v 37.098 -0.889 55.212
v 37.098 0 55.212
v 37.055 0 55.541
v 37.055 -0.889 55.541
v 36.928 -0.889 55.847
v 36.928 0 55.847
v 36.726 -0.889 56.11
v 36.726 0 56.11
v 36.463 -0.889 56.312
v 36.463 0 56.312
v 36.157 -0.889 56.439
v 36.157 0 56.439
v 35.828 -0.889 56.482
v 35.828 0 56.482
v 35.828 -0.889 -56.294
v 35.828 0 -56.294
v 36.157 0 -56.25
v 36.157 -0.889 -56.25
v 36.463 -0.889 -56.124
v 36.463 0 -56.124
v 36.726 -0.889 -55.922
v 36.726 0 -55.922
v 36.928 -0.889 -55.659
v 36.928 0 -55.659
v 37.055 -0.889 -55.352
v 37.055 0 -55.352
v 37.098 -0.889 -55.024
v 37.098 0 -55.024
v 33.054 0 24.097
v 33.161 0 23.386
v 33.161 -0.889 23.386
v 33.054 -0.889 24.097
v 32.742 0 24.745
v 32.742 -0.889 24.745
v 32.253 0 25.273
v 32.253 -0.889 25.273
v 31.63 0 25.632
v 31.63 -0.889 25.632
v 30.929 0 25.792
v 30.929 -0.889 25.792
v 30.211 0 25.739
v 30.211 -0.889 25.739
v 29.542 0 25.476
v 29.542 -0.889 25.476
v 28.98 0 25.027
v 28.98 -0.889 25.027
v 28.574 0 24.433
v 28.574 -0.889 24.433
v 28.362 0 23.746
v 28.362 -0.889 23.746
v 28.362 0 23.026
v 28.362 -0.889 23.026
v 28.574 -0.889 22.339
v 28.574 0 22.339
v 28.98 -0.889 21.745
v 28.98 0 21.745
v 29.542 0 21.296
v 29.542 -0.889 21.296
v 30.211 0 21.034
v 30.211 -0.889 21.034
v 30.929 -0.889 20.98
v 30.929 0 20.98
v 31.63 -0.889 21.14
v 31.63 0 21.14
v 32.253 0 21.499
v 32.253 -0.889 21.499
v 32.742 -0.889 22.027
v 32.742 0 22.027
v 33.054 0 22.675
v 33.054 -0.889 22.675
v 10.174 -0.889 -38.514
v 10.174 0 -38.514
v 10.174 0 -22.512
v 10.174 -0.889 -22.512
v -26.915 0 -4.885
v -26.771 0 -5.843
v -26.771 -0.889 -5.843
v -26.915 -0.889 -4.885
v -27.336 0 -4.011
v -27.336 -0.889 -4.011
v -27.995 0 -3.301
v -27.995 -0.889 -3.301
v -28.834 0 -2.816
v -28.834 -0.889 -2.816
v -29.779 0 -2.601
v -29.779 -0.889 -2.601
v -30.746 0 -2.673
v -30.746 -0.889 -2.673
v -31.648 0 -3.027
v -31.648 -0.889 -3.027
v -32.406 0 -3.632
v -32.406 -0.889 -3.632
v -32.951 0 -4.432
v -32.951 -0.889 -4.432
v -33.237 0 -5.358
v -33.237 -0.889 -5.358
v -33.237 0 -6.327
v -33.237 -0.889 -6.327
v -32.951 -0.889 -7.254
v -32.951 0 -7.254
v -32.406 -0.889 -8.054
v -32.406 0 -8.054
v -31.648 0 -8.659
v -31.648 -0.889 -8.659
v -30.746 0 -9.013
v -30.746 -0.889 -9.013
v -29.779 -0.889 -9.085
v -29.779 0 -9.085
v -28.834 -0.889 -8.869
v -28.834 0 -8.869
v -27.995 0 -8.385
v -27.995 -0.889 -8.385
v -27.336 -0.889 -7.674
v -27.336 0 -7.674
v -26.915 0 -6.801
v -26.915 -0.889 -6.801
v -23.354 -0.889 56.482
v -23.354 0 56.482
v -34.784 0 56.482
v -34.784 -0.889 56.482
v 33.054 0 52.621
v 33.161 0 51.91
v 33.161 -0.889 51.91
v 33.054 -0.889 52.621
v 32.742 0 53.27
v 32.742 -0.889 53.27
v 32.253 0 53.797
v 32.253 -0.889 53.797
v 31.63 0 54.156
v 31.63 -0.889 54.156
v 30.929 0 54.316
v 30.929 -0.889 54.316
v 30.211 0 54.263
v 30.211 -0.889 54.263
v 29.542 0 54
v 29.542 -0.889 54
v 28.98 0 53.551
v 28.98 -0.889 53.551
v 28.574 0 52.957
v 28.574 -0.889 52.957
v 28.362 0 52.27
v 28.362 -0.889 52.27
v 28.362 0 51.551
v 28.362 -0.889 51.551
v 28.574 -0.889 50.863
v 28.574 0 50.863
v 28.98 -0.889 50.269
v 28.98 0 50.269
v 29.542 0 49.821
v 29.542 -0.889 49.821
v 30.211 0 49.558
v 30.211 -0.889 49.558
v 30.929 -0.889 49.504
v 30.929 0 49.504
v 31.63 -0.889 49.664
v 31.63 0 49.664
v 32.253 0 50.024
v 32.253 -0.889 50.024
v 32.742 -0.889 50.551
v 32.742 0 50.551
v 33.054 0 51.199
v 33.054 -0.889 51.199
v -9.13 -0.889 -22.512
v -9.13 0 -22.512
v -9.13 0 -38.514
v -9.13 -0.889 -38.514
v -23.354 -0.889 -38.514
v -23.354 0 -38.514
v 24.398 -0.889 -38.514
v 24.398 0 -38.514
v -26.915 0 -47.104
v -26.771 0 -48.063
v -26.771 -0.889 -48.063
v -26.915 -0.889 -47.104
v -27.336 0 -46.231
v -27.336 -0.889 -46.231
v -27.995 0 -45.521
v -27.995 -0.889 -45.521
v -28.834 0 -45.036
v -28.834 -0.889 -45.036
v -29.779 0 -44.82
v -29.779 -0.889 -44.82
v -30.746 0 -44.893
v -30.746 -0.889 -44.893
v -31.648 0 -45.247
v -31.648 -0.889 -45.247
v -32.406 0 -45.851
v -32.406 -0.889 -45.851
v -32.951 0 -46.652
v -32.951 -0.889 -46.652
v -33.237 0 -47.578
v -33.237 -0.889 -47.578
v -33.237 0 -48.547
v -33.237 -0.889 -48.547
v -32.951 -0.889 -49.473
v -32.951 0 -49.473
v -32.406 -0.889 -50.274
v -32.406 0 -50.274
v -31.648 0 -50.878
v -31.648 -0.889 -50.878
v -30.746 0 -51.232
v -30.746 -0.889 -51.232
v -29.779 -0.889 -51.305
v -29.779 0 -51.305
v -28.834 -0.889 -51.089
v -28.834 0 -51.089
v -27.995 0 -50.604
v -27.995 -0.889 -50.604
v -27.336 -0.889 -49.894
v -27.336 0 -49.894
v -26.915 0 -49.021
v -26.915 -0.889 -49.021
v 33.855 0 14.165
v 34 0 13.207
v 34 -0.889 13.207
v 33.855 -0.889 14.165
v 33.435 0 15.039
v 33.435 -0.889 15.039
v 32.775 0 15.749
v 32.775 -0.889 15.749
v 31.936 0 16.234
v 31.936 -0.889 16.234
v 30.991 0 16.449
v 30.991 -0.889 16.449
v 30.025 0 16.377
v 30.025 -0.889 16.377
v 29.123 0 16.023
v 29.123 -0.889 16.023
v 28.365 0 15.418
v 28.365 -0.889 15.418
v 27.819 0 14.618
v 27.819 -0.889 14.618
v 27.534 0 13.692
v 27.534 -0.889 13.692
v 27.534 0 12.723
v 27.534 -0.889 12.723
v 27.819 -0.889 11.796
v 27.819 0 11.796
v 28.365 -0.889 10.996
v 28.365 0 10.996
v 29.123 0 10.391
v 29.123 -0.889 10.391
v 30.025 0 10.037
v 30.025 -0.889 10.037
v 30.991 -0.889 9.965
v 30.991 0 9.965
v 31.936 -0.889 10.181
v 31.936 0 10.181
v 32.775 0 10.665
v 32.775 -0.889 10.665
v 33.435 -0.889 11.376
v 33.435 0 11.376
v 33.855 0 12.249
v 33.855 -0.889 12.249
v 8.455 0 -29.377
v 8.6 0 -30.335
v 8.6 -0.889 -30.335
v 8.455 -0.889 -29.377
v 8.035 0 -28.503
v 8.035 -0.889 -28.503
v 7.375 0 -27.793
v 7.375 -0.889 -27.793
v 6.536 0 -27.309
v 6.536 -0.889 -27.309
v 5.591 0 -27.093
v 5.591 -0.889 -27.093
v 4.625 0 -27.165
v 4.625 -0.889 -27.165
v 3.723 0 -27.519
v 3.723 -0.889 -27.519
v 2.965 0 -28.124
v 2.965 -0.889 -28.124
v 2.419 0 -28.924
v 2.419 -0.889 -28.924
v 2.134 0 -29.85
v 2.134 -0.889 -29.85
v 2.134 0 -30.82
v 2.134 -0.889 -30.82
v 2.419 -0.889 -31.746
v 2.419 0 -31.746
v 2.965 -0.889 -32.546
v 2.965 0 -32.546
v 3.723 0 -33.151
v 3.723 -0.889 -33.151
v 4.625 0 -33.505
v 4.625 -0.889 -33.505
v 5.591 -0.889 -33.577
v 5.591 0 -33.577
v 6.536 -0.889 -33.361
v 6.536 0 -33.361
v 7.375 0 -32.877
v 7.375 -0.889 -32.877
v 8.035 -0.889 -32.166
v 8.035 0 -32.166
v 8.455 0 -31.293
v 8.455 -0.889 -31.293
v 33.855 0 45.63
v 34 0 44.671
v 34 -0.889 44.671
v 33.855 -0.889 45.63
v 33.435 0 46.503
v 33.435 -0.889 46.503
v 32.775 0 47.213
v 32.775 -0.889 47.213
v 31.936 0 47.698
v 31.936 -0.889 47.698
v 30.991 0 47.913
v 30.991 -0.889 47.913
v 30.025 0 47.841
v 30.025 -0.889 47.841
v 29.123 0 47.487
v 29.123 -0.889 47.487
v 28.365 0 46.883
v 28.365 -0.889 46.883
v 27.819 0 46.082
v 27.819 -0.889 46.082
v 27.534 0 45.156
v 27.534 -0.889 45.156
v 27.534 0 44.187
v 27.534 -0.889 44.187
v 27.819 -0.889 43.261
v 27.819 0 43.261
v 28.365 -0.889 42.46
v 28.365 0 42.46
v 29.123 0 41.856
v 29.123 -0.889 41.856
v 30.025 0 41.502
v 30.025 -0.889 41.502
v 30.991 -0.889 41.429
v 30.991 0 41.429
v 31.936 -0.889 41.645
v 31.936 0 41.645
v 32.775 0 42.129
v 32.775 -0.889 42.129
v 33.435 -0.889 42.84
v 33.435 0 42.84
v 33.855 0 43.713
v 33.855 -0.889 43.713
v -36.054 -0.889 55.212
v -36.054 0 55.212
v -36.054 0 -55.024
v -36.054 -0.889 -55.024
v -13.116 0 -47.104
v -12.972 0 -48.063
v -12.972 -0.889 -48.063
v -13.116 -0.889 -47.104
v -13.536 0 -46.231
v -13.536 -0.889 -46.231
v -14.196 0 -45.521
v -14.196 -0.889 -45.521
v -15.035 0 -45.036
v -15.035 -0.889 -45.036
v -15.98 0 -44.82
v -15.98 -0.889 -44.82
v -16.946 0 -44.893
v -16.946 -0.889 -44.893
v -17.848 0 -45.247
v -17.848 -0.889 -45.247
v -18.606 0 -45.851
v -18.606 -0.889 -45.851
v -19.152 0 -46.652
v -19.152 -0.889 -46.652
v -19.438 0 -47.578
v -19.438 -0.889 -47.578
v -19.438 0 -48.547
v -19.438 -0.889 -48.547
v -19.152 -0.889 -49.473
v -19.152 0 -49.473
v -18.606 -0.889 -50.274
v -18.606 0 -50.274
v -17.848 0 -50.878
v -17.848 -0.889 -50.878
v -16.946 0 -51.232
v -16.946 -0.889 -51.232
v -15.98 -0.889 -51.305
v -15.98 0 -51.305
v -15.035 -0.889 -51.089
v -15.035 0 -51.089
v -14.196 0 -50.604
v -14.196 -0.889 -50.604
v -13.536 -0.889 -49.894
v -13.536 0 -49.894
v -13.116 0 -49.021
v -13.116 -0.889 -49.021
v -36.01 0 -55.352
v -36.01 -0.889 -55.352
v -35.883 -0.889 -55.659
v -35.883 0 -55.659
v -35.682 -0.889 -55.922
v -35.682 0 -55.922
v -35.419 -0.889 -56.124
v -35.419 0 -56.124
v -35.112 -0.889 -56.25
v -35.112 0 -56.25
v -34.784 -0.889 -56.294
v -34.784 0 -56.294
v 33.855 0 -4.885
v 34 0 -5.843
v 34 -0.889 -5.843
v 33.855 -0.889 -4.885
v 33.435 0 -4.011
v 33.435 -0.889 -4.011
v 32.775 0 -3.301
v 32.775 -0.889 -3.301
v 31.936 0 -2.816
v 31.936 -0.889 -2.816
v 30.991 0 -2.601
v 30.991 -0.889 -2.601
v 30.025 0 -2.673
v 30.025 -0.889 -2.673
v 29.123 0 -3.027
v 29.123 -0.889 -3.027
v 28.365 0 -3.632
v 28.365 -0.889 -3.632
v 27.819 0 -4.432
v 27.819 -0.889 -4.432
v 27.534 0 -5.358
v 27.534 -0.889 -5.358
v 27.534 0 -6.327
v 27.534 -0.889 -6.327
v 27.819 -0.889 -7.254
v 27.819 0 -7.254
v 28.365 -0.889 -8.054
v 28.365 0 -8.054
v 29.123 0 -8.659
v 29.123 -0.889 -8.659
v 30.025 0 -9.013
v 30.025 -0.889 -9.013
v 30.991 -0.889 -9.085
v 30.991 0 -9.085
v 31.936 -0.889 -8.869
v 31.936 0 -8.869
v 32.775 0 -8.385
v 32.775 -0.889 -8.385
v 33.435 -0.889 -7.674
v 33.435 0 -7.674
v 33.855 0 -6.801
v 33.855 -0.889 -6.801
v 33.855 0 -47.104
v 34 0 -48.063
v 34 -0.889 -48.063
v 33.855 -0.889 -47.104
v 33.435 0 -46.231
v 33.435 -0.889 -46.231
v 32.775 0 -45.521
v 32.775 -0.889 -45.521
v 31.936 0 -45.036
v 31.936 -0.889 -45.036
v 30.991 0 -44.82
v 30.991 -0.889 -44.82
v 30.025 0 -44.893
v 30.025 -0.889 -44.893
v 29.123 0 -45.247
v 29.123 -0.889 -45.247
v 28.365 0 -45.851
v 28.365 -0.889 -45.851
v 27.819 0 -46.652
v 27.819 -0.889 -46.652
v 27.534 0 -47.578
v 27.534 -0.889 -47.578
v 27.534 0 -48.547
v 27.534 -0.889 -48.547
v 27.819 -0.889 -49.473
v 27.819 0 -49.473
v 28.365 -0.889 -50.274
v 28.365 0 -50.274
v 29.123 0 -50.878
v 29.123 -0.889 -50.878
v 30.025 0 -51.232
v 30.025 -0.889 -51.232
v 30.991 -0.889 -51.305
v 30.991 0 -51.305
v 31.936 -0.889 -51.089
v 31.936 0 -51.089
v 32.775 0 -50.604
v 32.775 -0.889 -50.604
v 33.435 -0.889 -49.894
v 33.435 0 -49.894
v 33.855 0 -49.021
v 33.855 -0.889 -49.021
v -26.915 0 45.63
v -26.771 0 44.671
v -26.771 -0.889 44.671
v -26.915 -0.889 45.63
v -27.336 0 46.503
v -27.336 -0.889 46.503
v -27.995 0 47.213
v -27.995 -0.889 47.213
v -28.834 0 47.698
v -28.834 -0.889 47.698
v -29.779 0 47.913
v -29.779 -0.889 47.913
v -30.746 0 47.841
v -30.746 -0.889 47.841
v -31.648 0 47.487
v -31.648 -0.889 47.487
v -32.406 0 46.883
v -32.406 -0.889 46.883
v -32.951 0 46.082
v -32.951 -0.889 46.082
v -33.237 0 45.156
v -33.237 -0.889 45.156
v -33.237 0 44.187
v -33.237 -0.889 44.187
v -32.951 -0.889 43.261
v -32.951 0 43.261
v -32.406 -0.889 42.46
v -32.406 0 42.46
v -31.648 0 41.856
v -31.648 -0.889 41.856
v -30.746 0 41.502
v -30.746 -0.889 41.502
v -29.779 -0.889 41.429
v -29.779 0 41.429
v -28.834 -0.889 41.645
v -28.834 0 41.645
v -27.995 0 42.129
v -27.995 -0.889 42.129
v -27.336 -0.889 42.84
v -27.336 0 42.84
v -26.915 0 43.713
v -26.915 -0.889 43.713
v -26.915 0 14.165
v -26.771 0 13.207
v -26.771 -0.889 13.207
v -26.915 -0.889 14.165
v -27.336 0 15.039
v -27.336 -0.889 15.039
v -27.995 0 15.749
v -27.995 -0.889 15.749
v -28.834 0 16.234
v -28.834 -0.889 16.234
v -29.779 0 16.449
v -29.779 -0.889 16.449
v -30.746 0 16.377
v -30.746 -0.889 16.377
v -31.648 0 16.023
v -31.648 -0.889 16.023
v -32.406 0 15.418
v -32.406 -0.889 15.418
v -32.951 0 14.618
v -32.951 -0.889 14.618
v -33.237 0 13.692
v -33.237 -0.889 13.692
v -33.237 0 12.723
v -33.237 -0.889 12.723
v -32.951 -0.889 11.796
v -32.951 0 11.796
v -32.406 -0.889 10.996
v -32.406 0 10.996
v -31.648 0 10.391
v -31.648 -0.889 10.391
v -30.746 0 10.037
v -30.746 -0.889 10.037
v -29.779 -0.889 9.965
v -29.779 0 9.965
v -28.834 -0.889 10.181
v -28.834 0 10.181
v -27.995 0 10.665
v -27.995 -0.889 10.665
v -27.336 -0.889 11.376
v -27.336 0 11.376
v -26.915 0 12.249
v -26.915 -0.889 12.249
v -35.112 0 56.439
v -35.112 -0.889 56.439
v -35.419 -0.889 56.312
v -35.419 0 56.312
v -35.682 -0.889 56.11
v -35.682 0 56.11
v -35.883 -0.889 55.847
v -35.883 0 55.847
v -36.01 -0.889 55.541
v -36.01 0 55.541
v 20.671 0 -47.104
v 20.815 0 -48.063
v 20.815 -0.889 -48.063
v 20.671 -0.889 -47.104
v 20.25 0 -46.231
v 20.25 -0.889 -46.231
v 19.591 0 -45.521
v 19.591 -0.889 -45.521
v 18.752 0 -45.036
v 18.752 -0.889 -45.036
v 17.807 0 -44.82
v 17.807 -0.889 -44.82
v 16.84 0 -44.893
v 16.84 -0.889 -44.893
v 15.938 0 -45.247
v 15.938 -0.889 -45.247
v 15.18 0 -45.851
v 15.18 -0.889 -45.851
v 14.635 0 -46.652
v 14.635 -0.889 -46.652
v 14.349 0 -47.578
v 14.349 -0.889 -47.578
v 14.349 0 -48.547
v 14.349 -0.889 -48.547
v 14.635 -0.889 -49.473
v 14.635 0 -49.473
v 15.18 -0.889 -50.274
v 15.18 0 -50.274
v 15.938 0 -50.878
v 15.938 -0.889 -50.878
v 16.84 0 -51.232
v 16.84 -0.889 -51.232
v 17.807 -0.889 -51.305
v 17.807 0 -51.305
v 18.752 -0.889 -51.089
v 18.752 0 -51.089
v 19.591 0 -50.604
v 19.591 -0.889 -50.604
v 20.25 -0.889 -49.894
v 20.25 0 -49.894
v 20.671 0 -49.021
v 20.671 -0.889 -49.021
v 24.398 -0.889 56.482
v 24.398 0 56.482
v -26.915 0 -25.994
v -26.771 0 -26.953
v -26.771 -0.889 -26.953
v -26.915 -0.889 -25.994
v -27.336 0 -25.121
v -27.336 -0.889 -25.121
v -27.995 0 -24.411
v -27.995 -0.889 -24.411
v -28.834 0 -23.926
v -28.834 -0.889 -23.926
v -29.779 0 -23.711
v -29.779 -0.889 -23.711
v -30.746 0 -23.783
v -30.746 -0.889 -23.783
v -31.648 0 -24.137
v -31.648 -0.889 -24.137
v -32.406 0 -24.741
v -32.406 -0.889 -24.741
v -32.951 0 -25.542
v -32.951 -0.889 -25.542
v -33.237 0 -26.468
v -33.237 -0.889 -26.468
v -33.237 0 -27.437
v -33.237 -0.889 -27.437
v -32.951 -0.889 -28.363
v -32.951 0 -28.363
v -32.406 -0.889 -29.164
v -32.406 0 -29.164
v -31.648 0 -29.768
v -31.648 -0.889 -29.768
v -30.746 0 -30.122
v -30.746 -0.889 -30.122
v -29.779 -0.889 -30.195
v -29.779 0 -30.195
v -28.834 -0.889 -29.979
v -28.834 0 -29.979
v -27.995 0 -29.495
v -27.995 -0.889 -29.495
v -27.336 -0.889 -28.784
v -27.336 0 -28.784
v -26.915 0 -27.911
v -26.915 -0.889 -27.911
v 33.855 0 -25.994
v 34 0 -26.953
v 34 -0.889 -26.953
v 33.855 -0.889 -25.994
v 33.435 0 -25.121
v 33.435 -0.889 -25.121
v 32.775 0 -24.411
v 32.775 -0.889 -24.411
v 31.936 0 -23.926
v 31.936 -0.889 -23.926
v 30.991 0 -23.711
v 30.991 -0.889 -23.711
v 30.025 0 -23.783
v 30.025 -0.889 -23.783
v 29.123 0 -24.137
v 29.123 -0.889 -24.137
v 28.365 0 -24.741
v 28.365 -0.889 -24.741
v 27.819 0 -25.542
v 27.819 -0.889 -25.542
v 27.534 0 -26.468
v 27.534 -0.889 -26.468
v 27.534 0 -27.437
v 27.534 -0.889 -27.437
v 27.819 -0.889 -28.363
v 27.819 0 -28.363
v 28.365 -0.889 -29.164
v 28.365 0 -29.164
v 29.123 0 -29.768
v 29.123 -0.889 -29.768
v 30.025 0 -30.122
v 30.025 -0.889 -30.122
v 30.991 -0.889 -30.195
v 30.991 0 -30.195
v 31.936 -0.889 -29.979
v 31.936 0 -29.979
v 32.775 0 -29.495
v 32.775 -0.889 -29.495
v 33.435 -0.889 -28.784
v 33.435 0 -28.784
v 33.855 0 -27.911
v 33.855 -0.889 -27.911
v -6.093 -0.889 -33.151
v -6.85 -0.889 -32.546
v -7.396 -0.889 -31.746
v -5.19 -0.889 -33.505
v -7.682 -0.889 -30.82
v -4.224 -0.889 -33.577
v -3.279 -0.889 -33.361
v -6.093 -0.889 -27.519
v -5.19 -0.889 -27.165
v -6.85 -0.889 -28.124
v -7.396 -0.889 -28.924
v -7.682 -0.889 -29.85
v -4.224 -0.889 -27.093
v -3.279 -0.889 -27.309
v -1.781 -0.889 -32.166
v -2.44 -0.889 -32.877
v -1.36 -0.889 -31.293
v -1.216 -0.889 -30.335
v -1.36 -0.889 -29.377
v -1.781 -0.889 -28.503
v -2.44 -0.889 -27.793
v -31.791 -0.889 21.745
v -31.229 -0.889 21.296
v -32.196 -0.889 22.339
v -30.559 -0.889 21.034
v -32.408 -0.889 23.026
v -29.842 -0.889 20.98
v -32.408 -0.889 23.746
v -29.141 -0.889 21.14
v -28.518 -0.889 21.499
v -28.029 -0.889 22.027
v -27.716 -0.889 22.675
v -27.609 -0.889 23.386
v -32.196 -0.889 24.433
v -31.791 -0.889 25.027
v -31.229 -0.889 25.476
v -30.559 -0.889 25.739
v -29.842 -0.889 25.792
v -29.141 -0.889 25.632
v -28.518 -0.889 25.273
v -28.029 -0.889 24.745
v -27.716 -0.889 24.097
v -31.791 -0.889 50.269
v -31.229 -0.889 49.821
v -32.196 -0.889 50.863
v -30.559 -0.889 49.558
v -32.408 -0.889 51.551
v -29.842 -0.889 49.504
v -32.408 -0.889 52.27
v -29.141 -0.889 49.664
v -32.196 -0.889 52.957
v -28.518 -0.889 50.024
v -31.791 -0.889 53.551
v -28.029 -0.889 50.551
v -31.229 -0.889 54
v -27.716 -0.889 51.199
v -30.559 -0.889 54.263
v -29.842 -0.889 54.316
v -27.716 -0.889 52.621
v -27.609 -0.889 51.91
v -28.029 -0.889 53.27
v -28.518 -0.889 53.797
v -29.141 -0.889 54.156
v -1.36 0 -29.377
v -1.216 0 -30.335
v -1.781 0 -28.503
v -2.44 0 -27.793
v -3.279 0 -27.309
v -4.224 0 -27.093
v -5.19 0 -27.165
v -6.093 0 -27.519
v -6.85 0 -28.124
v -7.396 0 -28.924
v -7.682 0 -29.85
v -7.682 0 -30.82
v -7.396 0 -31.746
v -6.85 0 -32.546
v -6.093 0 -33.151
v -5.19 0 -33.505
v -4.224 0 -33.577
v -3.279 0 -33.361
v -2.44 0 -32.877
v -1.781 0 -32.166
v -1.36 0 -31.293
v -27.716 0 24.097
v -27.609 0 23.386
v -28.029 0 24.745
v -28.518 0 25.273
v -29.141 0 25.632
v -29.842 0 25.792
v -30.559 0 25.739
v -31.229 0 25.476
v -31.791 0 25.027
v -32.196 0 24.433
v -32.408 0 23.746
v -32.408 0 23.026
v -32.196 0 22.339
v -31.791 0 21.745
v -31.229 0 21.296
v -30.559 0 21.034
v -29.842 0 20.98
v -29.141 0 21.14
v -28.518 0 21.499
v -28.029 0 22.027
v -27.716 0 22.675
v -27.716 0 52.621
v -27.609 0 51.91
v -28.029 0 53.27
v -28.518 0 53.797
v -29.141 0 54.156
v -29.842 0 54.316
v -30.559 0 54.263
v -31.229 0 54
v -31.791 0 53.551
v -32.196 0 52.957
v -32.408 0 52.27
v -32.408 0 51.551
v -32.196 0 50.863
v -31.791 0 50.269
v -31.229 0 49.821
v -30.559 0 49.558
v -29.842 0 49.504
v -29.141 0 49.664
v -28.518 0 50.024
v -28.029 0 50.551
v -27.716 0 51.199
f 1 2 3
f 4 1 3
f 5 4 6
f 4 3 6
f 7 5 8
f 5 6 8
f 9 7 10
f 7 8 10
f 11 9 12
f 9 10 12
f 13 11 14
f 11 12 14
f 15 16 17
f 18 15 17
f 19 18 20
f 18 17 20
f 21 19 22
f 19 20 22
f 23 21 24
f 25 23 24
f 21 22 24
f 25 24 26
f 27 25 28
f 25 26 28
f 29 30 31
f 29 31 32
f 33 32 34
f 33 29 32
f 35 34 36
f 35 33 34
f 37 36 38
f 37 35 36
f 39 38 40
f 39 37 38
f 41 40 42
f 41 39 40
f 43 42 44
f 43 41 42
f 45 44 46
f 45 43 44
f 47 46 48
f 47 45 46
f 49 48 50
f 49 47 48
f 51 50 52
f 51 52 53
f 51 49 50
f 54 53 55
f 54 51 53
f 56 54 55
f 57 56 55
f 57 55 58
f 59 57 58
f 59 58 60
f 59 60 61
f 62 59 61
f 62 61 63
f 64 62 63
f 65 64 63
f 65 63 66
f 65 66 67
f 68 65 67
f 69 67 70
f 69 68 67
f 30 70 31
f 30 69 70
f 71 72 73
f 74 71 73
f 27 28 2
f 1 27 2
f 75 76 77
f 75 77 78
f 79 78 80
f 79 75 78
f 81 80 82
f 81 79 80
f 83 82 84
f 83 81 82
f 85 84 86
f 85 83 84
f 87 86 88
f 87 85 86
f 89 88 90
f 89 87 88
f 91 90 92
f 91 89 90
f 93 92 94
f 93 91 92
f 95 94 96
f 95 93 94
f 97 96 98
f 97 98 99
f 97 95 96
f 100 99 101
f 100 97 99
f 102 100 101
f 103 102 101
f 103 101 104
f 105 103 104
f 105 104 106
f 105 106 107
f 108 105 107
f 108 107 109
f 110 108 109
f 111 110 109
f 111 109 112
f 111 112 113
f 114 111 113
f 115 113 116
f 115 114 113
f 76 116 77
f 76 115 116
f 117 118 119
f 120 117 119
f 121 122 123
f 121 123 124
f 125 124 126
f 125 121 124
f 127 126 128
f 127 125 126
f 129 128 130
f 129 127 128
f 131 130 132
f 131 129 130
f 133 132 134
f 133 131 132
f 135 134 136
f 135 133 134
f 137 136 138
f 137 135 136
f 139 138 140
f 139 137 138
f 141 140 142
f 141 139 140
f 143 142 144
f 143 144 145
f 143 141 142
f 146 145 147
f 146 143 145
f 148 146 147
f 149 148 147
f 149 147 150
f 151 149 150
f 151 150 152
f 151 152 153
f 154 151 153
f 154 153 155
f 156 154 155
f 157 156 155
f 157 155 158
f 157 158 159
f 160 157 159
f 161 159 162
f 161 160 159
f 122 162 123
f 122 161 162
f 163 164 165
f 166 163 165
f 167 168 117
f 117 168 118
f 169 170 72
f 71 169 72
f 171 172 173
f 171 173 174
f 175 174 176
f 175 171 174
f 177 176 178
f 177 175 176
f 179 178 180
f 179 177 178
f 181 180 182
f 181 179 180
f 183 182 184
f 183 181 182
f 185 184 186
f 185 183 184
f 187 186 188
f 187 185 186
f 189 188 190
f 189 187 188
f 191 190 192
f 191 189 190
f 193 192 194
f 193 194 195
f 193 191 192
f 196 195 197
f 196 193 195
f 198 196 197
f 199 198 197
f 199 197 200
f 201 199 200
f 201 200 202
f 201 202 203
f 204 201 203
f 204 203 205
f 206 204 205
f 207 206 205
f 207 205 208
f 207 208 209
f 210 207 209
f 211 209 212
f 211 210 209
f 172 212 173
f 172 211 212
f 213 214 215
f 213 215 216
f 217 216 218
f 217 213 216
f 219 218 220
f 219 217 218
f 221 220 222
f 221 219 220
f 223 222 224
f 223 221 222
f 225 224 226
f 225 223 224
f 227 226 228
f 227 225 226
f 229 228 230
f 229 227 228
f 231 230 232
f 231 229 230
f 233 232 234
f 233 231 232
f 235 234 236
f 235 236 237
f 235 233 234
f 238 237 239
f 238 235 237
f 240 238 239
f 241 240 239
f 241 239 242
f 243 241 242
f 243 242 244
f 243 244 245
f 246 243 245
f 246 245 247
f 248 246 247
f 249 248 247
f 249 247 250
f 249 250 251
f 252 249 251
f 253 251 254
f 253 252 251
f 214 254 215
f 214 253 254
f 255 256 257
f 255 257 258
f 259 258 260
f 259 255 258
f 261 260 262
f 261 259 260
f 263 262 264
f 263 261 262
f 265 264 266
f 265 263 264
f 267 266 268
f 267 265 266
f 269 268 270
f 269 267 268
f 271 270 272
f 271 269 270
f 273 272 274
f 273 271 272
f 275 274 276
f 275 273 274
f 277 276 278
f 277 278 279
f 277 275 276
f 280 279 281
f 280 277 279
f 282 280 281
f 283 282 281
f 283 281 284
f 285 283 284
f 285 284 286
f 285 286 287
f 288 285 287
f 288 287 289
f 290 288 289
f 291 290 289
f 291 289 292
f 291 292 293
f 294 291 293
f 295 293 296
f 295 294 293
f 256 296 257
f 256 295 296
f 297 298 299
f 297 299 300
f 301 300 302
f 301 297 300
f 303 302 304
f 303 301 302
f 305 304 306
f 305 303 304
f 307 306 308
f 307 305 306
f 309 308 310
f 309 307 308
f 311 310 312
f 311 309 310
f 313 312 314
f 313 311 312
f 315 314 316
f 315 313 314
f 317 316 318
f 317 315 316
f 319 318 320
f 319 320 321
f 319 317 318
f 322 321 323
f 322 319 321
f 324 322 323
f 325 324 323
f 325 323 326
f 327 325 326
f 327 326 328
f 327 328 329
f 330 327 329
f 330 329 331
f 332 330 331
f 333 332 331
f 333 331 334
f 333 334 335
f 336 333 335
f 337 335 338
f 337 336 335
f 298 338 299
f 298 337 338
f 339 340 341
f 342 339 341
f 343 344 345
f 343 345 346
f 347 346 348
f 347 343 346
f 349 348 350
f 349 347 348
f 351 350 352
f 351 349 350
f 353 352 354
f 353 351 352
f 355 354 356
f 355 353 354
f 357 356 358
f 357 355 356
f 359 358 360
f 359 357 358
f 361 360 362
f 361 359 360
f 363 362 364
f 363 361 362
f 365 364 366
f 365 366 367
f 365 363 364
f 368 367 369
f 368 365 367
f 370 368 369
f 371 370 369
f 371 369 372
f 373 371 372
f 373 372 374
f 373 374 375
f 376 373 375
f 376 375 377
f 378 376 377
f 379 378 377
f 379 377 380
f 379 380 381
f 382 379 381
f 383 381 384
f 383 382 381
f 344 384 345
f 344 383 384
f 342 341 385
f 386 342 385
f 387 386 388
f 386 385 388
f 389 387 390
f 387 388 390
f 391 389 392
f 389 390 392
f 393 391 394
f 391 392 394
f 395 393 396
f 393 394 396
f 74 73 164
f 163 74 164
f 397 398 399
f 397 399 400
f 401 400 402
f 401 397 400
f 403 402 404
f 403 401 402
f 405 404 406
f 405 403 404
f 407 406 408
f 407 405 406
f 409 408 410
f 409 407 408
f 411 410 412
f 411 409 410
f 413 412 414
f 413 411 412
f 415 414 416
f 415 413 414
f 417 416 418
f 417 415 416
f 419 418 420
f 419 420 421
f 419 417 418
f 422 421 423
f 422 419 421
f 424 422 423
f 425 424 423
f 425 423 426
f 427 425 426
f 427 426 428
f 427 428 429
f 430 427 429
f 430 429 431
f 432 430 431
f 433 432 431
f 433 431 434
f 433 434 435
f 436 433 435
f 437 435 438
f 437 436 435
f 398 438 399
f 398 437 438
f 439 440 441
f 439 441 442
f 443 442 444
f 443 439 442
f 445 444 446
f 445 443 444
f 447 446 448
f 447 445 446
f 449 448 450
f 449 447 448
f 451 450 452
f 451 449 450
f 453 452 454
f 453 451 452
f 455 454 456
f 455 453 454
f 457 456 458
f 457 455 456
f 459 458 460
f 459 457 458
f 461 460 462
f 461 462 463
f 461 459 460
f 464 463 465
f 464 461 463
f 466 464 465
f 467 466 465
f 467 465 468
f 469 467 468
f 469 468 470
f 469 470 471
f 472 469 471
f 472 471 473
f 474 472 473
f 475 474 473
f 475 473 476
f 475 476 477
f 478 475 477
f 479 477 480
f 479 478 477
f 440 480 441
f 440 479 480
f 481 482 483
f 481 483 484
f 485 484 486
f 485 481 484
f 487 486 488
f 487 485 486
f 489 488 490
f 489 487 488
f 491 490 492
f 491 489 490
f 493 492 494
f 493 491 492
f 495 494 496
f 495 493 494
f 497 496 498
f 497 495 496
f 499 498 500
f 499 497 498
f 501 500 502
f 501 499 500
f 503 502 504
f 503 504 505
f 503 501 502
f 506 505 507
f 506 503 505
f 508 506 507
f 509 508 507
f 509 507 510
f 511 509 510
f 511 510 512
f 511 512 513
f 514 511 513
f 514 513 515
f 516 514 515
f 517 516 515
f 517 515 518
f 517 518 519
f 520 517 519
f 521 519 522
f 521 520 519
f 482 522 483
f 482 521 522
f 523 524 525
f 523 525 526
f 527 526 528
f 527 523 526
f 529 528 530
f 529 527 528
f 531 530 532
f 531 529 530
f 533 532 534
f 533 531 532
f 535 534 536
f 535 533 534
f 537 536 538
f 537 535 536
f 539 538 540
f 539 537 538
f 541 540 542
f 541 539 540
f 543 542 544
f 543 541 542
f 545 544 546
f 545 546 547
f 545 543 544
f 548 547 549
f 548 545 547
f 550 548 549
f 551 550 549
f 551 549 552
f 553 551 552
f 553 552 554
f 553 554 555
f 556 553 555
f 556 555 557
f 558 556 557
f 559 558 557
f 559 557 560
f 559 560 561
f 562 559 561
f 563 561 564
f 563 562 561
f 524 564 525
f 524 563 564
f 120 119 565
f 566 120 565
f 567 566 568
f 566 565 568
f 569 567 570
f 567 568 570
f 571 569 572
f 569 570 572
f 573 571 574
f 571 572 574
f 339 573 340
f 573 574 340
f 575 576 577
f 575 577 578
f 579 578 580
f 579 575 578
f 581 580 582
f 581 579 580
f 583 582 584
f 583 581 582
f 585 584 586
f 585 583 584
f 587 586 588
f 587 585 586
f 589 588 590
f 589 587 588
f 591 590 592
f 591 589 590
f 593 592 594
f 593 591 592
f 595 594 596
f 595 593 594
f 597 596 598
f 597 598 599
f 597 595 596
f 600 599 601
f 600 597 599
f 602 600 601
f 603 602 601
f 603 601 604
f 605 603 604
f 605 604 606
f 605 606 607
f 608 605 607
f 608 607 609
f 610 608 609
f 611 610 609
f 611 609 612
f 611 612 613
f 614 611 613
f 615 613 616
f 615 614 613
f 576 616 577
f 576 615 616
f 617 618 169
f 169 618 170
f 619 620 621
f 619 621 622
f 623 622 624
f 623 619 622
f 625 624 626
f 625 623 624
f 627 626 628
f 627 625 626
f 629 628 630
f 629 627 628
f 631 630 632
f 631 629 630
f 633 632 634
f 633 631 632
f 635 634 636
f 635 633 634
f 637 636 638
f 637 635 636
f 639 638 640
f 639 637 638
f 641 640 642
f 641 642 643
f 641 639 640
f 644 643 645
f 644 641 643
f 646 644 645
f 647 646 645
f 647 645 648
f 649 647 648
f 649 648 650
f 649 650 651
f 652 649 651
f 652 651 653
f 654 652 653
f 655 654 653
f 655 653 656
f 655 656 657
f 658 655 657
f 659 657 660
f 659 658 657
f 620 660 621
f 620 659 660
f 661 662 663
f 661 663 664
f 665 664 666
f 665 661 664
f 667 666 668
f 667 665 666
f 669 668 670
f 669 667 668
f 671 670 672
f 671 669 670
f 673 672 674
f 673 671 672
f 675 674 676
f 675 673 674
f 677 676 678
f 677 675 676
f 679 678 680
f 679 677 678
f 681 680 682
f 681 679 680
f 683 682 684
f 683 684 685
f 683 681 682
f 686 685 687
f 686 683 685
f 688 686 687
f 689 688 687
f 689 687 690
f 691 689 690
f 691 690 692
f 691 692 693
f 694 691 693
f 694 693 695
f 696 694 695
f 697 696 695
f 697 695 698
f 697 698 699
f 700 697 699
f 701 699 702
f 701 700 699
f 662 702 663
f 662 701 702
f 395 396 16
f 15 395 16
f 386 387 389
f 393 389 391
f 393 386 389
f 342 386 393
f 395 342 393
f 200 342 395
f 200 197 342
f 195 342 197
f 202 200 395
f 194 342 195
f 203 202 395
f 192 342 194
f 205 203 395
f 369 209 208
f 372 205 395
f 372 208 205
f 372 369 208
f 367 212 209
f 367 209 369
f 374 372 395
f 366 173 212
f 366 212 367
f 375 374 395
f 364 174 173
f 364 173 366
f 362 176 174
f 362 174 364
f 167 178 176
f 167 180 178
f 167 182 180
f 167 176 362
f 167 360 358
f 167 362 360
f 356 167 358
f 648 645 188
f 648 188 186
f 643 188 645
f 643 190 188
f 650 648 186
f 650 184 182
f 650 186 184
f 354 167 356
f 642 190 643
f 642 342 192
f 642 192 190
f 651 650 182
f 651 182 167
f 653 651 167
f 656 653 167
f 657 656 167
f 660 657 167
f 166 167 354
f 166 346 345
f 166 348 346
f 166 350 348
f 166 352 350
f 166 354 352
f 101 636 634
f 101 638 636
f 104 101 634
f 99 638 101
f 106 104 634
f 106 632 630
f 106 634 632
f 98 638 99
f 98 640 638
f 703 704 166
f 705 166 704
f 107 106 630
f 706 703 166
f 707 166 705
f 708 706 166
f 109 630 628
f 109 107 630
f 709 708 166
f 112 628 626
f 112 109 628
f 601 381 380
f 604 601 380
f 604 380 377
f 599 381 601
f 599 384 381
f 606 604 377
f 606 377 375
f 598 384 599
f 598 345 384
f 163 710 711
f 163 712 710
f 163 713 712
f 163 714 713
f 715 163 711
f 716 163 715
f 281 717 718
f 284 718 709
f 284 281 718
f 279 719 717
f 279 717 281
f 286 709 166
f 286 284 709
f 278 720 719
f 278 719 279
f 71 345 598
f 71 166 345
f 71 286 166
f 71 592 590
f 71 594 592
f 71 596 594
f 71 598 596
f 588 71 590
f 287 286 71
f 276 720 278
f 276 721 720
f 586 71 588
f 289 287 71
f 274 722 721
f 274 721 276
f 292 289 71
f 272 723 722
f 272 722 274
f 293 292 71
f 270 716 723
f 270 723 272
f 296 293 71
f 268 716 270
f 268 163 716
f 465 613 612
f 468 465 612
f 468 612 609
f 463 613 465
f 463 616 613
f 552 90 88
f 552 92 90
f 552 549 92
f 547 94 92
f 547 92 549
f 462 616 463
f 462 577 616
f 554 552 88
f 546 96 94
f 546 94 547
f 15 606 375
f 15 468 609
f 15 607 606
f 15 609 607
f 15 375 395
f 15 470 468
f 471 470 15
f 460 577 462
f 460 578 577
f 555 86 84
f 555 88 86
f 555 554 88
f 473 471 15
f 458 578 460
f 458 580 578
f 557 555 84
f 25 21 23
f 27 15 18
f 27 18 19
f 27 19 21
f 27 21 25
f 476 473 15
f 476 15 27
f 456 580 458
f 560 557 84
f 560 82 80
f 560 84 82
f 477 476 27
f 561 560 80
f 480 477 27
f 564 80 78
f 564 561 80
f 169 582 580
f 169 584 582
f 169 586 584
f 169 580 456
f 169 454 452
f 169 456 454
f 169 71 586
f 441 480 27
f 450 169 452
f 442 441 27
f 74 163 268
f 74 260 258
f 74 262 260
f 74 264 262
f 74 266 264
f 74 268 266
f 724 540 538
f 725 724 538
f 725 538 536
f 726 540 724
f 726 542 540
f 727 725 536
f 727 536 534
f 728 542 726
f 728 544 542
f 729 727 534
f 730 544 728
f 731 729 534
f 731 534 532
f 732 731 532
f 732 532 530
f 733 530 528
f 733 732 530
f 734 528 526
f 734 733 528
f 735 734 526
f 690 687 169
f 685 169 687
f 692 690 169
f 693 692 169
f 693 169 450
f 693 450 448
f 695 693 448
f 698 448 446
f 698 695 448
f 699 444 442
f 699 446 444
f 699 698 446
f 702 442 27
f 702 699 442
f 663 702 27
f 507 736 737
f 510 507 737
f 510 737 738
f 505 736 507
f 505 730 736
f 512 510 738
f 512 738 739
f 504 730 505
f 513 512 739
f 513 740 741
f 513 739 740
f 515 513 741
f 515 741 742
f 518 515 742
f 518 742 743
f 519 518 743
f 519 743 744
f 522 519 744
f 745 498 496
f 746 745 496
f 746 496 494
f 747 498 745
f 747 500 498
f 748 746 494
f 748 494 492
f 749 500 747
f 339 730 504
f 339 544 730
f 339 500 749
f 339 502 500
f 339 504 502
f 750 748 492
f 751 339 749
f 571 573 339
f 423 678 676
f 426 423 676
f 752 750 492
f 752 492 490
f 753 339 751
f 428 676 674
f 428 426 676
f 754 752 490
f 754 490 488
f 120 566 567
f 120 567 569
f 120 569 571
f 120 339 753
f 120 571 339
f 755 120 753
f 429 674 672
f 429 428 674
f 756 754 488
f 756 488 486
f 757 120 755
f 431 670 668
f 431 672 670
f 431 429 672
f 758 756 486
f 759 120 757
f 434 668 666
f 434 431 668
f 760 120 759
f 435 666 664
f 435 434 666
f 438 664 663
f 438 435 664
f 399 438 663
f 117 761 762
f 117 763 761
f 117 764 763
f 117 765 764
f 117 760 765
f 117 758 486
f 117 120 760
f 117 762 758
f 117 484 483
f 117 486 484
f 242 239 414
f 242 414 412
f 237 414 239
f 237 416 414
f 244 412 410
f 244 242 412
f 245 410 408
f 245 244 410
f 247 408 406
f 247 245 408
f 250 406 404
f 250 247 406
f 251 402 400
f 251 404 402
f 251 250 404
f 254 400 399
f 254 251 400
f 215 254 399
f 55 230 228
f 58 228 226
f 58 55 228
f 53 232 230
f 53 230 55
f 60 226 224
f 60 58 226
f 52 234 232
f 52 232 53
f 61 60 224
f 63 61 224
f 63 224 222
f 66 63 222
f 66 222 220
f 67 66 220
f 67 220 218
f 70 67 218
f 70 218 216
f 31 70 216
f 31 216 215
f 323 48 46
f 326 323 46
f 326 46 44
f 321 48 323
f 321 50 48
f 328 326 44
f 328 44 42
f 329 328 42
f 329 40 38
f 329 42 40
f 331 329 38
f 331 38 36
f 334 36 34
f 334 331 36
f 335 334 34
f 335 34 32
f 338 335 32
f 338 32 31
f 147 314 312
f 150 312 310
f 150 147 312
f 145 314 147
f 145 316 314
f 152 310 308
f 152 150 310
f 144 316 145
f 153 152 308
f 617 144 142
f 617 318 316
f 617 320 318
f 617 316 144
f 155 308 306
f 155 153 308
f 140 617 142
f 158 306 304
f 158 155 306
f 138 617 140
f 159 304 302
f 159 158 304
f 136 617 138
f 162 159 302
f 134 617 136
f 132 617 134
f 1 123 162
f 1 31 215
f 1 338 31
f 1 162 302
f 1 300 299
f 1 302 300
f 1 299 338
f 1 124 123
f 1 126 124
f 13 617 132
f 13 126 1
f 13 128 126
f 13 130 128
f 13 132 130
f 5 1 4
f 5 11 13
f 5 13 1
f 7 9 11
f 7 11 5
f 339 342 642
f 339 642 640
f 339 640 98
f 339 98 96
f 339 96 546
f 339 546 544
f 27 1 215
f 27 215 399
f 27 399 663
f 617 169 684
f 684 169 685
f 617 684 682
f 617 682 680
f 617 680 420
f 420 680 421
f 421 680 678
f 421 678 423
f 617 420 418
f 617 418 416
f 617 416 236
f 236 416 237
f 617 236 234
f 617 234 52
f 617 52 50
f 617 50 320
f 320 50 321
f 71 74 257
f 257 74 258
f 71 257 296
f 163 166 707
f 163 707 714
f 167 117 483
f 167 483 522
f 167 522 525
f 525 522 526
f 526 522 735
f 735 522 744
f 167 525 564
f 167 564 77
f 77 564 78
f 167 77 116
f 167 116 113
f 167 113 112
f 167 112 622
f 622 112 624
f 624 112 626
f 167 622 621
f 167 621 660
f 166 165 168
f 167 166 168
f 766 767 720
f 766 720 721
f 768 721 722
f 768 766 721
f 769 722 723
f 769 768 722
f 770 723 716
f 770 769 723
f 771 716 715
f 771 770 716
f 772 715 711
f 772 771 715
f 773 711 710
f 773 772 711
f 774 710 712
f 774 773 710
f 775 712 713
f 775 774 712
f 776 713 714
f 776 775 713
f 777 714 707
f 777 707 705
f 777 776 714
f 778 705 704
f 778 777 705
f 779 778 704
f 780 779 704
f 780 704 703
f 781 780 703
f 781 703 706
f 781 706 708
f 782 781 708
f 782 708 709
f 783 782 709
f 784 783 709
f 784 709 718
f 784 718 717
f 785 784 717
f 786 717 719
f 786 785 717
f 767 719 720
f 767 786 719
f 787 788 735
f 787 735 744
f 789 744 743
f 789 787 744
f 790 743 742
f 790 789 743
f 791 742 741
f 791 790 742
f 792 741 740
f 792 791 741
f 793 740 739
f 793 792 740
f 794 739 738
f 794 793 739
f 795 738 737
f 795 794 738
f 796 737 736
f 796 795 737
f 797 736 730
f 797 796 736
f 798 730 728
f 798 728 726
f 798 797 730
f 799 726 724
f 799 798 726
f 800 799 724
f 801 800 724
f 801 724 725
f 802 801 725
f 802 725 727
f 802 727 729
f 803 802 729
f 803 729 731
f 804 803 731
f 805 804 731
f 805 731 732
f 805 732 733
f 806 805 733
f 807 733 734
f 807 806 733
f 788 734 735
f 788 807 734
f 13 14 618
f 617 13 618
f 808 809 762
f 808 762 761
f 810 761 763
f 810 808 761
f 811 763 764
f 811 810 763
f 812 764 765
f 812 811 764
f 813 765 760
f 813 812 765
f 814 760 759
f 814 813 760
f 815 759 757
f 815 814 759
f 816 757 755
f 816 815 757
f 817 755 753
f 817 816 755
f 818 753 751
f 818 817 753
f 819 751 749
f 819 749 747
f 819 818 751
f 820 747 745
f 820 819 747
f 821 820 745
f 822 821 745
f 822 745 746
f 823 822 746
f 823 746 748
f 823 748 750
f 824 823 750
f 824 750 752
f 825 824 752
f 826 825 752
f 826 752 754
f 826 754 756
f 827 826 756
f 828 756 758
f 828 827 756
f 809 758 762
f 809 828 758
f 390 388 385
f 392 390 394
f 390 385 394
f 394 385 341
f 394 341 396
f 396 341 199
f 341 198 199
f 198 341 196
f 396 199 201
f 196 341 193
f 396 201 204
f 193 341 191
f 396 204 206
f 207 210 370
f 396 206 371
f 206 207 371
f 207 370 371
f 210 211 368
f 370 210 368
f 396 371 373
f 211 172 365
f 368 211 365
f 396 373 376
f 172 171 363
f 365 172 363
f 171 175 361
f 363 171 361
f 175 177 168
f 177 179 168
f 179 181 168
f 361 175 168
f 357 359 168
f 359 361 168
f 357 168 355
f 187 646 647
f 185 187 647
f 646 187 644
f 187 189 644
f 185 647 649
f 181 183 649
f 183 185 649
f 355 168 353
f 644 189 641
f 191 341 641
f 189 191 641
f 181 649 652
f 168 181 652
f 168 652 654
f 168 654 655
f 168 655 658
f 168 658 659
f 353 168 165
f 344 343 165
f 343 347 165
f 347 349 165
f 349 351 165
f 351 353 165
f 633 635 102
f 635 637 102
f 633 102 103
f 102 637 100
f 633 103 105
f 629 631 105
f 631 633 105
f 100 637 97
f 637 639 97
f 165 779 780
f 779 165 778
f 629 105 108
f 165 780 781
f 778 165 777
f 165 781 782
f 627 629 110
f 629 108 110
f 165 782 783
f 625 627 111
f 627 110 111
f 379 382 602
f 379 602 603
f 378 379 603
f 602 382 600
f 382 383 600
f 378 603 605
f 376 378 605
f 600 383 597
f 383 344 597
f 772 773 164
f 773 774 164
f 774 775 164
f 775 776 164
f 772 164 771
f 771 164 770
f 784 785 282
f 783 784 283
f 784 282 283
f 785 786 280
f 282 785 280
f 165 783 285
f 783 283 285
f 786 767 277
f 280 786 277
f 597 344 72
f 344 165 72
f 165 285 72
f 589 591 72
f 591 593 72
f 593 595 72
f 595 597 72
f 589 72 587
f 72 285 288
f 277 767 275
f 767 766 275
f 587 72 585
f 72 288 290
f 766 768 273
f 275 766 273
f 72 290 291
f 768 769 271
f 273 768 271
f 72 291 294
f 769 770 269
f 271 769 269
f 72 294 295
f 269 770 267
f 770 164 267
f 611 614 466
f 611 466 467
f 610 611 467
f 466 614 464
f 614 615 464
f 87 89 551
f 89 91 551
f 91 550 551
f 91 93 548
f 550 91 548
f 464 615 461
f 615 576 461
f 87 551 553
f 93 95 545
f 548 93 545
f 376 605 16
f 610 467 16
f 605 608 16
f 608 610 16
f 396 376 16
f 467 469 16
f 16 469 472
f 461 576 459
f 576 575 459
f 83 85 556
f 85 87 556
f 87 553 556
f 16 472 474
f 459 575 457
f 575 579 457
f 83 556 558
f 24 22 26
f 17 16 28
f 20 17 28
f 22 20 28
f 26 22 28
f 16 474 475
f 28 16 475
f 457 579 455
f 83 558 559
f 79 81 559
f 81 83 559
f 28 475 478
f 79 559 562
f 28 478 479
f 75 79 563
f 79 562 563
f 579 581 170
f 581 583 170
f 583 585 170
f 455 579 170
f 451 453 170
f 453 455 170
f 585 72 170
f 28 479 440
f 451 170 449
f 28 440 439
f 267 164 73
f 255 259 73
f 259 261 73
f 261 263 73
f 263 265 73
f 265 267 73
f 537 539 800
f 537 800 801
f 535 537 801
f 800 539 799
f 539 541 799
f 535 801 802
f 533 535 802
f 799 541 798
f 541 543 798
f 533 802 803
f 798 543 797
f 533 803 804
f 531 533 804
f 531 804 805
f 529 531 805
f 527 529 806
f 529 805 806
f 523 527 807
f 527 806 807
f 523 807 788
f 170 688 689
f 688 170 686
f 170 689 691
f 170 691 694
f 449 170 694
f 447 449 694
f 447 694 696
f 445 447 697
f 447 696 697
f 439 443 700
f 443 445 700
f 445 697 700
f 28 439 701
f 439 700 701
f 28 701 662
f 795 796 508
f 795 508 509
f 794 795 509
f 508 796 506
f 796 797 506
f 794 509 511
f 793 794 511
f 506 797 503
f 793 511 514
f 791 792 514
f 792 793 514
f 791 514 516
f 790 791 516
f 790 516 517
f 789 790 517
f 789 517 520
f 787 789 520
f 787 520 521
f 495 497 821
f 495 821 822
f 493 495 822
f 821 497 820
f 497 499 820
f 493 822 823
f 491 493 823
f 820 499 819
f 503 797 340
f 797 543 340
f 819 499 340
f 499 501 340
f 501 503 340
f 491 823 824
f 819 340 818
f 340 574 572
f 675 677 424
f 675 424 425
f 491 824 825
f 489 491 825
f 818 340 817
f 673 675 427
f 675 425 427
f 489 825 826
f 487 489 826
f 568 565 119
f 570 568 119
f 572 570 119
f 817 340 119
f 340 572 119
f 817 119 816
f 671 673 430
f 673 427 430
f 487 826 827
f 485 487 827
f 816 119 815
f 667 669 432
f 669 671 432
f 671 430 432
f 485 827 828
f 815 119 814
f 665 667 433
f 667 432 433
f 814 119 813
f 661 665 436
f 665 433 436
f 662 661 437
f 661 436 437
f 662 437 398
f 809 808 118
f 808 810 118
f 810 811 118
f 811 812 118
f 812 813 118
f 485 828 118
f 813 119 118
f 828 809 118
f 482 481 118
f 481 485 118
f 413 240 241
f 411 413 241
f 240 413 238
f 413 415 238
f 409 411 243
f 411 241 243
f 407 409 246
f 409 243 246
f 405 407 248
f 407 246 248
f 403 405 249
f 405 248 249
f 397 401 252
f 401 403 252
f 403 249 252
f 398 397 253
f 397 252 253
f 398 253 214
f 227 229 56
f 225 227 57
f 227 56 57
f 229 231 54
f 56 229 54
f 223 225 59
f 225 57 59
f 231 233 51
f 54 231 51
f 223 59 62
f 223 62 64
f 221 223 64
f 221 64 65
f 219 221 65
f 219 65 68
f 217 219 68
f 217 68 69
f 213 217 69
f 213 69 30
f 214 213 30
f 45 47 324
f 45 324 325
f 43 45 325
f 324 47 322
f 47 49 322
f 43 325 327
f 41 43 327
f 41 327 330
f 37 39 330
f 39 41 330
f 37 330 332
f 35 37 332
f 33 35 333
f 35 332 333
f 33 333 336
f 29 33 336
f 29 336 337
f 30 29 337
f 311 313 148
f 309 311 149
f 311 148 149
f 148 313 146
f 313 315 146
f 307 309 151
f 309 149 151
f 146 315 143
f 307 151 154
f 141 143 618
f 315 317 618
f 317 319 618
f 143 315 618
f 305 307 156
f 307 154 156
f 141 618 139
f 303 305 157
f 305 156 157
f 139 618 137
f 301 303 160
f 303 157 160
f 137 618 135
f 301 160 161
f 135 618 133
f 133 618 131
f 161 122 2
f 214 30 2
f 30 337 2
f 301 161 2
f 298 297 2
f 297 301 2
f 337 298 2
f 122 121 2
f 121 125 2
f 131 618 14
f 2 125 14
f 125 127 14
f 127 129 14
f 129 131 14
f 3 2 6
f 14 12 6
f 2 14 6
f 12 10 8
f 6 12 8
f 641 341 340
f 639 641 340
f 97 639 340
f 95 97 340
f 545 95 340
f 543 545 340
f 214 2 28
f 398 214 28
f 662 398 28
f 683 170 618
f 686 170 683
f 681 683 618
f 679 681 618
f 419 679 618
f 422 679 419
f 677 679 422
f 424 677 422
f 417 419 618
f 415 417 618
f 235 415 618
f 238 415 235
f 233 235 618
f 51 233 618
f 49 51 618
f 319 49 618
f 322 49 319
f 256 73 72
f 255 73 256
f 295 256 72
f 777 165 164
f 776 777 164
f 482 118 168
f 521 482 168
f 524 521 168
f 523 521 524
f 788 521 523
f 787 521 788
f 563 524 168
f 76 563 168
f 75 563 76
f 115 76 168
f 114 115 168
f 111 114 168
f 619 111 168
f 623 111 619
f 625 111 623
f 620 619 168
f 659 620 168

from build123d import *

# Parameters (mm, degrees)
F0_R     = 3.2512
F0_R_2   = 2.413
F1_DEPTH = 0.889


with BuildPart() as f1:
    # F0 (on Front) → F1 (new body)
    with BuildSketch(Plane.XZ):
        with BuildLine():
            ThreePointArc((-34.7836, 56.482241), (-35.681625, 56.110266), (-36.0536, 55.212241))
            Line((-36.0536, 55.212241), (-36.0536, -55.023759))
            ThreePointArc((-36.0536, -55.023759), (-35.681625, -55.921785), (-34.7836, -56.293759))
            Line((-34.7836, -56.293759), (35.8284, -56.293759))
            ThreePointArc((35.8284, -56.293759), (36.726426, -55.921785), (37.0984, -55.023759))
            Line((37.0984, -55.023759), (37.0984, 55.212241))
            ThreePointArc((37.0984, 55.212241), (36.726426, 56.110266), (35.8284, 56.482241))
            Line((35.8284, 56.482241), (24.3984, 56.482241))
            Line((24.3984, 56.482241), (24.3984, -38.513759))
            Line((24.3984, -38.513759), (10.1744, -38.513759))
            Line((10.1744, -38.513759), (10.1744, -22.511759))
            Line((10.1744, -22.511759), (-9.1296, -22.511759))
            Line((-9.1296, -22.511759), (-9.1296, -38.513759))
            Line((-9.1296, -38.513759), (-23.3536, -38.513759))
            Line((-23.3536, -38.513759), (-23.3536, 56.482241))
            Line((-23.3536, 56.482241), (-34.7836, 56.482241))
        make_face()
        with Locations((-30.022221, -48.062544)):
            Circle(F0_R, mode=Mode.SUBTRACT)
        with Locations((-16.222711, -48.062544)):
            Circle(F0_R, mode=Mode.SUBTRACT)
        with Locations((-4.467035, -30.334959)):
            Circle(F0_R, mode=Mode.SUBTRACT)
        with Locations((-30.022221, -26.952723)):
            Circle(F0_R, mode=Mode.SUBTRACT)
        with Locations((-30.022221, -5.842898)):
            Circle(F0_R, mode=Mode.SUBTRACT)
        with Locations((17.563765, -48.062544)):
            Circle(F0_R, mode=Mode.SUBTRACT)
        with Locations((5.348405, -30.334959)):
            Circle(F0_R, mode=Mode.SUBTRACT)
        with Locations((30.7484, -48.062544)):
            Circle(F0_R, mode=Mode.SUBTRACT)
        with Locations((30.7484, -26.952723)):
            Circle(F0_R, mode=Mode.SUBTRACT)
        with Locations((30.7484, -5.842898)):
            Circle(F0_R, mode=Mode.SUBTRACT)
        with Locations((-30.022221, 13.207102)):
            Circle(F0_R, mode=Mode.SUBTRACT)
        with Locations((-30.022221, 23.386041)):
            Circle(F0_R_2, mode=Mode.SUBTRACT)
        with Locations((-30.022221, 44.671241)):
            Circle(F0_R, mode=Mode.SUBTRACT)
        with Locations((-30.022221, 51.910241)):
            Circle(F0_R_2, mode=Mode.SUBTRACT)
        with Locations((30.7484, 13.207102)):
            Circle(F0_R, mode=Mode.SUBTRACT)
        with Locations((30.7484, 23.386041)):
            Circle(F0_R_2, mode=Mode.SUBTRACT)
        with Locations((30.7484, 44.671241)):
            Circle(F0_R, mode=Mode.SUBTRACT)
        with Locations((30.7484, 51.910241)):
            Circle(F0_R_2, mode=Mode.SUBTRACT)
    extrude(amount=F1_DEPTH)


solid = f1.part
